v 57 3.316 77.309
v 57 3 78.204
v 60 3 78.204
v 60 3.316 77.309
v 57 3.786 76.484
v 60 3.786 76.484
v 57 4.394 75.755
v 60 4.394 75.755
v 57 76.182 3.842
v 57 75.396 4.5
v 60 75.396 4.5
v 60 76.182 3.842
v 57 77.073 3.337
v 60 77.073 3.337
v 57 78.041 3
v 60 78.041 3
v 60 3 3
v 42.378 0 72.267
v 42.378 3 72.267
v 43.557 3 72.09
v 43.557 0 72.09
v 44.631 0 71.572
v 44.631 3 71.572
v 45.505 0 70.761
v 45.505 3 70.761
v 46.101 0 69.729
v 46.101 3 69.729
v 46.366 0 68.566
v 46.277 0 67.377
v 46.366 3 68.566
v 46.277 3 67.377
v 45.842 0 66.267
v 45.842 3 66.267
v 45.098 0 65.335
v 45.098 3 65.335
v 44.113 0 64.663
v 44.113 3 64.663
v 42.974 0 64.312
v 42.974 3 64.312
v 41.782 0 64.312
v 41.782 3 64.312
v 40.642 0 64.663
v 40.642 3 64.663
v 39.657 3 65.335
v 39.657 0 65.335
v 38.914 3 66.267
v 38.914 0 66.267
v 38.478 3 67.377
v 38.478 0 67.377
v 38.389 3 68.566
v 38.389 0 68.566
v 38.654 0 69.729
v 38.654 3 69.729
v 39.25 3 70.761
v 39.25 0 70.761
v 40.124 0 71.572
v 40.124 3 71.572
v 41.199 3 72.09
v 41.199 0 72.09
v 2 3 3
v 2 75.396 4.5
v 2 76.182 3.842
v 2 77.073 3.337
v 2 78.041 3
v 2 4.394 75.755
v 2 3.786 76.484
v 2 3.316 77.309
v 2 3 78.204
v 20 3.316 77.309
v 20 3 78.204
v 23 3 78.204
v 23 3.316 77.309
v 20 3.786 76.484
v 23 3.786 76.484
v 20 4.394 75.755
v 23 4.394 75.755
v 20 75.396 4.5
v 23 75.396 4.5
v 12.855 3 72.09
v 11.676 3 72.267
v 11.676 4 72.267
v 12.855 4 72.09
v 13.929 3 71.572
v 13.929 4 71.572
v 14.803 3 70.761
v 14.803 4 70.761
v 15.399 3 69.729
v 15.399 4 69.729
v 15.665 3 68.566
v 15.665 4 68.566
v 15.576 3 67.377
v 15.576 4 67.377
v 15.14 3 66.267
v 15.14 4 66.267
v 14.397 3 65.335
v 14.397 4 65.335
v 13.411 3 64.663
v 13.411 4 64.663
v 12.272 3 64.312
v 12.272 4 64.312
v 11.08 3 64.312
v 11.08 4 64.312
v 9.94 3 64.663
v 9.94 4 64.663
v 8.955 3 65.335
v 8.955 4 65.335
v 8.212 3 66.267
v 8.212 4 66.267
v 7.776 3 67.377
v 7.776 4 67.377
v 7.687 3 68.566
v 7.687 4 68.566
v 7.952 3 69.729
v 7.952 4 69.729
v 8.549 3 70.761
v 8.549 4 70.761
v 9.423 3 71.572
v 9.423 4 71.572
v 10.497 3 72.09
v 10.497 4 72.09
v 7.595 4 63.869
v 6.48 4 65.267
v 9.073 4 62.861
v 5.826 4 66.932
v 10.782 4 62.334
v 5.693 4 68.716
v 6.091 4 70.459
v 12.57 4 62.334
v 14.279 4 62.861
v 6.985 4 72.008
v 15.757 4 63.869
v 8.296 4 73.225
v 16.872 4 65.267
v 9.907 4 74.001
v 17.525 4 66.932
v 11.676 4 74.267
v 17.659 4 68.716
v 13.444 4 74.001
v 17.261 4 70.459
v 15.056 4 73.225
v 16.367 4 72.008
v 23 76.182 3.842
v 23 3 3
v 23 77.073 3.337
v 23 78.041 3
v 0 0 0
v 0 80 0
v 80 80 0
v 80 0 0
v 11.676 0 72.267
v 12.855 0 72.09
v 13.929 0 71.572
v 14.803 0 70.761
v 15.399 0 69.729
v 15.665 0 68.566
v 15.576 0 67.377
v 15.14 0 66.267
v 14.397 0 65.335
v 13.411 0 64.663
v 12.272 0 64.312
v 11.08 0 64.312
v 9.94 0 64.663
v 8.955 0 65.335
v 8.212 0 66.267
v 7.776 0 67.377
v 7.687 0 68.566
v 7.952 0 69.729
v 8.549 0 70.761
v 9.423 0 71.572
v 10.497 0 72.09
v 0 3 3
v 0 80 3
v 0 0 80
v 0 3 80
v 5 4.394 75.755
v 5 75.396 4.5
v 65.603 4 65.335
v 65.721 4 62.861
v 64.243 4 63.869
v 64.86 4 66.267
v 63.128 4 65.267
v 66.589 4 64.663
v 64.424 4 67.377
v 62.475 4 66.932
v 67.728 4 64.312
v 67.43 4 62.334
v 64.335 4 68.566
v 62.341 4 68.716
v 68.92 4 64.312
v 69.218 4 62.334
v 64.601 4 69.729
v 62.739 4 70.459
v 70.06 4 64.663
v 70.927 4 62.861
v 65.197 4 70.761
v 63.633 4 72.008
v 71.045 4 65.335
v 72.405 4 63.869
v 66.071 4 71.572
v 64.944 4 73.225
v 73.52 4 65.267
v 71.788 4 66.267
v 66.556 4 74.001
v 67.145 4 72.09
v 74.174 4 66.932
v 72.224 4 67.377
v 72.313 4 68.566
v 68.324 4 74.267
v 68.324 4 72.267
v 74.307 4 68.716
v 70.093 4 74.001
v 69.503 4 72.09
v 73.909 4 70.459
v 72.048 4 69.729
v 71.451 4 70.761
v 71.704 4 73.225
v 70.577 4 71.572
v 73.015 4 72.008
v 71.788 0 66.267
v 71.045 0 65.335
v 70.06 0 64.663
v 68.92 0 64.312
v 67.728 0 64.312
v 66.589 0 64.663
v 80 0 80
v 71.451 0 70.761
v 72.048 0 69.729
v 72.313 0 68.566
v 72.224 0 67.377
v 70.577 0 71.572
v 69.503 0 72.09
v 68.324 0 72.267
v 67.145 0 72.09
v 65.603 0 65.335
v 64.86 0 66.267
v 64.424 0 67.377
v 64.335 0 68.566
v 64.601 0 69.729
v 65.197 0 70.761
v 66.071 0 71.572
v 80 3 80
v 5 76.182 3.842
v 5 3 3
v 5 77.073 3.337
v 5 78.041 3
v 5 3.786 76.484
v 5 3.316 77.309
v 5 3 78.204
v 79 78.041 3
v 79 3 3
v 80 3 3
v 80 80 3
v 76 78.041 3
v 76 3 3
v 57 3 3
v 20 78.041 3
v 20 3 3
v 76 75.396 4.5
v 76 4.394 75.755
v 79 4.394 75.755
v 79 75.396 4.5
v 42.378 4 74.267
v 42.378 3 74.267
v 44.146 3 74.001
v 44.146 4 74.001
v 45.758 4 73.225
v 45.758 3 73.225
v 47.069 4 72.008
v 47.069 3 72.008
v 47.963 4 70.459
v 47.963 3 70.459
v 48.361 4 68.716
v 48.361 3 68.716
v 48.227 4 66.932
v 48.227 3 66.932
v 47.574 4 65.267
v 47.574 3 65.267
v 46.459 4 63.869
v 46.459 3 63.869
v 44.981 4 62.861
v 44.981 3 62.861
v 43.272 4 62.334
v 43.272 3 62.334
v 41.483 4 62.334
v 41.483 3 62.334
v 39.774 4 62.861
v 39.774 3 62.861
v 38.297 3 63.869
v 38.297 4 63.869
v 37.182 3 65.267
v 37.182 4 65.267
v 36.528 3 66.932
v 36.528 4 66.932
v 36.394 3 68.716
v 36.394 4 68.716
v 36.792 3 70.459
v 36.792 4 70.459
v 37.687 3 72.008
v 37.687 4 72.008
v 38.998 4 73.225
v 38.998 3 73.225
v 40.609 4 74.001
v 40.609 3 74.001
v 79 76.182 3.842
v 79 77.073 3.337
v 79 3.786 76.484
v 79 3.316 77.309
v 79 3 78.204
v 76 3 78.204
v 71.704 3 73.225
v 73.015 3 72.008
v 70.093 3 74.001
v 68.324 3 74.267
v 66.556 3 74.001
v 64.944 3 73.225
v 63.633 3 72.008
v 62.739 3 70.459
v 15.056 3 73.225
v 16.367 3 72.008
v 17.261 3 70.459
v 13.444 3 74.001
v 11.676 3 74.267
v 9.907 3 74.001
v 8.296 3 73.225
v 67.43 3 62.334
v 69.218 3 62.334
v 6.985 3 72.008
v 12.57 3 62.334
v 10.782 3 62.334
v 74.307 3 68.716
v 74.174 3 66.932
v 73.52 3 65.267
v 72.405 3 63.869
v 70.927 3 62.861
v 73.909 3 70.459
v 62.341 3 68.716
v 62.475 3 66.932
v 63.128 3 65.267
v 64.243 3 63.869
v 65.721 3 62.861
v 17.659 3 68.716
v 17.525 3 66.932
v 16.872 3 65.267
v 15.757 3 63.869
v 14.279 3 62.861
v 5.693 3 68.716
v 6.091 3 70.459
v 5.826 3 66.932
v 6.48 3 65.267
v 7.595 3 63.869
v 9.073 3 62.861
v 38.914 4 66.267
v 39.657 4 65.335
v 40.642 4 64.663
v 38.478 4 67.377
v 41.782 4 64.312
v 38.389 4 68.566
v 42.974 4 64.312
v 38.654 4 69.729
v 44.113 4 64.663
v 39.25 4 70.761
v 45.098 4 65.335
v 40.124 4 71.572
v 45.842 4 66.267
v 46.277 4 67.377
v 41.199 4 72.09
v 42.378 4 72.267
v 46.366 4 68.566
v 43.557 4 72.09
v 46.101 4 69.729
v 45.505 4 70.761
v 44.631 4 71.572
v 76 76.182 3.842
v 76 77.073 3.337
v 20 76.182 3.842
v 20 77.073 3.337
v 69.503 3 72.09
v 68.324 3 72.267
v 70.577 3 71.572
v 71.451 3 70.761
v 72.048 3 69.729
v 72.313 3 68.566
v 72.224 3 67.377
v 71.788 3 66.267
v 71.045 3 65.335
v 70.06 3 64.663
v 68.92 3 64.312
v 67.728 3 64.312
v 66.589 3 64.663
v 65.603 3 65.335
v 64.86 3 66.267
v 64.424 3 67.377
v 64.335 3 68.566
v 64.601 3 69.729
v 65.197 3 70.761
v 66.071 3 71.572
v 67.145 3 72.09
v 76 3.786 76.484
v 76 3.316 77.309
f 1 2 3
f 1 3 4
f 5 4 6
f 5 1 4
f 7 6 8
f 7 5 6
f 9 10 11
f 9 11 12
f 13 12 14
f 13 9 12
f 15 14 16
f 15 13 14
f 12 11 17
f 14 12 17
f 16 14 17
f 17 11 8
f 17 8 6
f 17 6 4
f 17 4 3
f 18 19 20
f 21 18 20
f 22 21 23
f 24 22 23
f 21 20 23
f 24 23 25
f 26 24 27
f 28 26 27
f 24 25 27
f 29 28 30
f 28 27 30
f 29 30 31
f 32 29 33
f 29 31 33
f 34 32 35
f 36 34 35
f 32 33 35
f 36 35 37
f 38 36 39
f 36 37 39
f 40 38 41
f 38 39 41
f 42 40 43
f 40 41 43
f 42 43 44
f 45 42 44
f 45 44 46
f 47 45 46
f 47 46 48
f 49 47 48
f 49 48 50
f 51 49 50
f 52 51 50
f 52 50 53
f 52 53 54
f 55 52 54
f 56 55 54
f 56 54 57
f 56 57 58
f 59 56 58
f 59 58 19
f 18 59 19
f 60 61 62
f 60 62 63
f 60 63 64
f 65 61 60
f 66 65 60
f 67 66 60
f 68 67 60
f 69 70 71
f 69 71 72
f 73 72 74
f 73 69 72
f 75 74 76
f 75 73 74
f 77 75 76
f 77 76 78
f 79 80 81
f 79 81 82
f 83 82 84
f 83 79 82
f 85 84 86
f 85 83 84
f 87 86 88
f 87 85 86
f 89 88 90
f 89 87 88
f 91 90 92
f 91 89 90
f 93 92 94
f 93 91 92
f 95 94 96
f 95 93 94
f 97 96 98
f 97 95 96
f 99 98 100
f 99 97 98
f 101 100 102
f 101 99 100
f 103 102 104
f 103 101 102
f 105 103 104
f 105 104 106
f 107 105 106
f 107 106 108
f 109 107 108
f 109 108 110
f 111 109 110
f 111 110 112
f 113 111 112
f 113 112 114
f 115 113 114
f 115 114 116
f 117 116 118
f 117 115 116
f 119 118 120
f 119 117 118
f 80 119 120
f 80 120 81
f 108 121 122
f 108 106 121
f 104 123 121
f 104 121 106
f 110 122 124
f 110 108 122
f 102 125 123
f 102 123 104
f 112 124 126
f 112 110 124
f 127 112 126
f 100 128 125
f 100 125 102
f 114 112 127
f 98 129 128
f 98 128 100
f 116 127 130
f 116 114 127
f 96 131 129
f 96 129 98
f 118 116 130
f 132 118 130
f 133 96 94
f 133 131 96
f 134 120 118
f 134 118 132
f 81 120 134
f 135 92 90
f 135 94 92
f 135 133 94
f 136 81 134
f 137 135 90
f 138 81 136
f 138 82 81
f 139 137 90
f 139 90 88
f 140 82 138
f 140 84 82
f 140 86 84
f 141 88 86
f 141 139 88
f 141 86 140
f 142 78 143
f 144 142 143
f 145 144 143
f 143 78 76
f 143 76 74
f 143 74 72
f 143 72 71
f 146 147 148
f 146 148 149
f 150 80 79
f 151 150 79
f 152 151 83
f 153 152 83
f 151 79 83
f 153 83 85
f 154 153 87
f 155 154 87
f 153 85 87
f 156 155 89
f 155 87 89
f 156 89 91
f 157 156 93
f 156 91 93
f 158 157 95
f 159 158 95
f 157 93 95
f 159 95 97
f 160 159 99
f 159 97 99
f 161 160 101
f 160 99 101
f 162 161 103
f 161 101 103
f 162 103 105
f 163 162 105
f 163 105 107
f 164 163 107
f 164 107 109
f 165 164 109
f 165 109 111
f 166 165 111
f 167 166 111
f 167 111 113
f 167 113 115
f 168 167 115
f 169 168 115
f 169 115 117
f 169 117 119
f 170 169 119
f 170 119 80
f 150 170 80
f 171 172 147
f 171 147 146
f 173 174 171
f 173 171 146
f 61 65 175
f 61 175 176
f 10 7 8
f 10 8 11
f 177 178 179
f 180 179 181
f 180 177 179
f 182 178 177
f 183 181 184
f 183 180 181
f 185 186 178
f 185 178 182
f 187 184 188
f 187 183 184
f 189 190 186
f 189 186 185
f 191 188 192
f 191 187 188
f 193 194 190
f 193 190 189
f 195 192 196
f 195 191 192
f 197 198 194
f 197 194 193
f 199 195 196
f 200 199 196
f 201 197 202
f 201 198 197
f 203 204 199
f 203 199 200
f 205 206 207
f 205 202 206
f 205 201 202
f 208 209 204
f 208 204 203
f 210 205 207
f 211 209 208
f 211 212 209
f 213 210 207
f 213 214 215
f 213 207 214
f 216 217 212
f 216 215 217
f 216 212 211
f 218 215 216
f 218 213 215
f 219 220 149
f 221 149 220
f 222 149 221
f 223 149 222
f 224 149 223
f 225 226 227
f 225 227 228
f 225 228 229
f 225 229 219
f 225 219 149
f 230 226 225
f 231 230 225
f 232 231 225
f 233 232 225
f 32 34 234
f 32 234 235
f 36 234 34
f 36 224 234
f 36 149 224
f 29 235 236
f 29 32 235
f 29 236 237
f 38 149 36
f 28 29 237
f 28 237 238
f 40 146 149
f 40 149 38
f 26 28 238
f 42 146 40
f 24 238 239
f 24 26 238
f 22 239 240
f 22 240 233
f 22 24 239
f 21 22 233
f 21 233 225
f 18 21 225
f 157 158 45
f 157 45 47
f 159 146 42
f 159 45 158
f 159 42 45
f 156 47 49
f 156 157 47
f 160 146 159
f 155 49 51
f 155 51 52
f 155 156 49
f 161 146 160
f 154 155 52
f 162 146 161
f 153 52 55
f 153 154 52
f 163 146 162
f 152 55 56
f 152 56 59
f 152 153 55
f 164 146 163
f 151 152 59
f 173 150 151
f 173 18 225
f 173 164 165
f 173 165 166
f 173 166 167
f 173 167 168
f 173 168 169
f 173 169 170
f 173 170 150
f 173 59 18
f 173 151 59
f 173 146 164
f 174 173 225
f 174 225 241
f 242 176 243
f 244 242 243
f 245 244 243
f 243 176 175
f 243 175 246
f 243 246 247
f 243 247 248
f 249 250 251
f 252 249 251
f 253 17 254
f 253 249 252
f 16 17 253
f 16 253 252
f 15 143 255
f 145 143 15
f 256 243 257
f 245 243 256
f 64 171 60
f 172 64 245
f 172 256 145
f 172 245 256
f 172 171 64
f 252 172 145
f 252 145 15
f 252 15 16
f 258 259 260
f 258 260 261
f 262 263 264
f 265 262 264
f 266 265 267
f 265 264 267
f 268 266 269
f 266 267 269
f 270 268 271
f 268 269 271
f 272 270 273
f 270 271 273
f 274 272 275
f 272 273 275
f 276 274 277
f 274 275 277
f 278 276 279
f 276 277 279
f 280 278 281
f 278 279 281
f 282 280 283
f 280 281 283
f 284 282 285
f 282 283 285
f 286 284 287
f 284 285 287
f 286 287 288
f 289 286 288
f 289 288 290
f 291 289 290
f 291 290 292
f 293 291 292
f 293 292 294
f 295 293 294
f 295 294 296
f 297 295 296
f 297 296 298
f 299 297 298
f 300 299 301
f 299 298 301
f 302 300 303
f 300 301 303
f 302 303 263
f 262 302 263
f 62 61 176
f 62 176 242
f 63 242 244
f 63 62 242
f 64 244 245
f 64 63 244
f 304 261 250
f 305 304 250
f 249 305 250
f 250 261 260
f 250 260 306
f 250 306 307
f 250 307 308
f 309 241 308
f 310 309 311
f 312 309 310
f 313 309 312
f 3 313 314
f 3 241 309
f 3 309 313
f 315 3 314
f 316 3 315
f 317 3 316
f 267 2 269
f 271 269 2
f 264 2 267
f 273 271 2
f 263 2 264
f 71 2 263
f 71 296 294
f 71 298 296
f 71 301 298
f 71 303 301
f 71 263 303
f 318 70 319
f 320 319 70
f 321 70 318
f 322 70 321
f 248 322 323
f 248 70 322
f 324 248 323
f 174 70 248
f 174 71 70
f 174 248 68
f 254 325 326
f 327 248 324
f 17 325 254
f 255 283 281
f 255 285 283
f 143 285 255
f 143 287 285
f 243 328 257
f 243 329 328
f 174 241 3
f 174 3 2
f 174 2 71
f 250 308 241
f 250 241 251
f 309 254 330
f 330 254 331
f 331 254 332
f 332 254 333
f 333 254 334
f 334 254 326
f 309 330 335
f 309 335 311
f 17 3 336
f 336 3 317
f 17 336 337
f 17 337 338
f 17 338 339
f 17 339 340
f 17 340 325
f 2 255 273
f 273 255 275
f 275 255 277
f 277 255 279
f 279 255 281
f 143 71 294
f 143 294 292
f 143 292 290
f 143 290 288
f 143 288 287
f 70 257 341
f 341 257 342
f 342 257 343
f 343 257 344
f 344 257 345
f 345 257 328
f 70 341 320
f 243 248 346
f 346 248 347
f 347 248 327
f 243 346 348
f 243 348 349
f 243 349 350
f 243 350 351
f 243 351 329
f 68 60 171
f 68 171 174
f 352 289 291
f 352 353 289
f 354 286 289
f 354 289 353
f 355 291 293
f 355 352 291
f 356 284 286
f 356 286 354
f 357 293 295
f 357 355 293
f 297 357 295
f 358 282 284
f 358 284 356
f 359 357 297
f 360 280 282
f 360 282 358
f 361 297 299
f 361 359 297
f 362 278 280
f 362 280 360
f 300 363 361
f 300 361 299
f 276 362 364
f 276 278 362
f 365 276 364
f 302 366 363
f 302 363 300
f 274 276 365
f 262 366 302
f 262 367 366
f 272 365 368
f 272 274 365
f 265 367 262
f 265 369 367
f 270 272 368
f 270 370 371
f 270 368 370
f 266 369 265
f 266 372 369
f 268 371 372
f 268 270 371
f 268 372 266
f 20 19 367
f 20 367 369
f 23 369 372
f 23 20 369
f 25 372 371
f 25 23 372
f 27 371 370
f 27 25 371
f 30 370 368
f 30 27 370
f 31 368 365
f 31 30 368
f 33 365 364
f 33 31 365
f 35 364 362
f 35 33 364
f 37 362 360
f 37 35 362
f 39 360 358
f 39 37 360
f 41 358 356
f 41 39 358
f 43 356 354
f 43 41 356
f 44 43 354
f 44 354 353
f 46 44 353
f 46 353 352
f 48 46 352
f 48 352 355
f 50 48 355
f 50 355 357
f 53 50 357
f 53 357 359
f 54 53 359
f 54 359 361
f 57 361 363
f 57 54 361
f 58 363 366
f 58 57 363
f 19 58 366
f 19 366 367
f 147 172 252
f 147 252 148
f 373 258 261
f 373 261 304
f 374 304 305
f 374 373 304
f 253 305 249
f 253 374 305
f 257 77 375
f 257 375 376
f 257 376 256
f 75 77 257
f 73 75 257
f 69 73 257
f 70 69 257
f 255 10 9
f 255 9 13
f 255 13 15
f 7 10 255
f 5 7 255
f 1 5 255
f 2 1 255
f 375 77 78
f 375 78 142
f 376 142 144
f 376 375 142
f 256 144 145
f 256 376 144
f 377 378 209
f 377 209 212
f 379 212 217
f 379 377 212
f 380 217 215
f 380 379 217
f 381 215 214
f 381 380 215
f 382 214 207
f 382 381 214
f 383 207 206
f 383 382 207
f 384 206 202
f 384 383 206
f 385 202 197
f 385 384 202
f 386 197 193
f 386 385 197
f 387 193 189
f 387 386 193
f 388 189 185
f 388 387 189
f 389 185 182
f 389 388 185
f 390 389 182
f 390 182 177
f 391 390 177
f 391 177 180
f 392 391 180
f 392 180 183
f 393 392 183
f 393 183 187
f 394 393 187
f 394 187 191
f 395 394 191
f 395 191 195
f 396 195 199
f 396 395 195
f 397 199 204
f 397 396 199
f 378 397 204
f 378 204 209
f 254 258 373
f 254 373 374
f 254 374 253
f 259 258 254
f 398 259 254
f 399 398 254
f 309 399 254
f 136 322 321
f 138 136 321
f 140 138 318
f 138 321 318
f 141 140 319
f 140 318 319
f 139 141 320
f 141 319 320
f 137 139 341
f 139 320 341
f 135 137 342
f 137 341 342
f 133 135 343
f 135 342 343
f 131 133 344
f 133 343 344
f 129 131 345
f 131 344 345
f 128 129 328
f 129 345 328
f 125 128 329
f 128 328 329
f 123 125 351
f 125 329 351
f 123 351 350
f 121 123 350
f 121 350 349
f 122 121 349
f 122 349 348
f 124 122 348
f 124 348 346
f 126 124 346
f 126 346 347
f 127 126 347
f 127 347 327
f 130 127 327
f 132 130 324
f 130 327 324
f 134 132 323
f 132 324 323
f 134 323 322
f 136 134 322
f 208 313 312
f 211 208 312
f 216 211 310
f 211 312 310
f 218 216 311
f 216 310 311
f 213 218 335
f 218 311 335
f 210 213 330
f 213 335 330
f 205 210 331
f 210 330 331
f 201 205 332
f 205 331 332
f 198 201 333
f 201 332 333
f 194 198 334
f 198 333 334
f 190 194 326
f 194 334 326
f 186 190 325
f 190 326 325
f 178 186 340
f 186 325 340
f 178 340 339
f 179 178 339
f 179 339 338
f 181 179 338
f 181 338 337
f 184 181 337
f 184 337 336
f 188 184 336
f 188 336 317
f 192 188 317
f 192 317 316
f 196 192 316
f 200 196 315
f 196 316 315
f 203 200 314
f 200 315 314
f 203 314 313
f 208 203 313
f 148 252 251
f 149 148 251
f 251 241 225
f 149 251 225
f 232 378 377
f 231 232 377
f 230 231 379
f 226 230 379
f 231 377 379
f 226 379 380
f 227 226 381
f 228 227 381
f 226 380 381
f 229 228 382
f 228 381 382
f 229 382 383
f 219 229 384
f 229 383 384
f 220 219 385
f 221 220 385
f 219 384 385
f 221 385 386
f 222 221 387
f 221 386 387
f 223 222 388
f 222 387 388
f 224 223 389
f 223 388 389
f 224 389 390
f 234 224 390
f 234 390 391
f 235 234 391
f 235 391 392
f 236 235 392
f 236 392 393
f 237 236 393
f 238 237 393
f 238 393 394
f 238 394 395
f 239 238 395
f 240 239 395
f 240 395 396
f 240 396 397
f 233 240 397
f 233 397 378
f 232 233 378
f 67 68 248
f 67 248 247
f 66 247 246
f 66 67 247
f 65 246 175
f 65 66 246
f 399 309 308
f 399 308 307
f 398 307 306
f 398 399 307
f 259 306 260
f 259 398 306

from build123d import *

# Parameters (mm, degrees)
PAD001_DEPTH  = 3
PAD_DEPTH     = 80
SKETCH002_R   = 4
POCKET_DEPTH  = 3.001
SKETCH003_R   = 6
SKETCH003_R_2 = 4
PAD002_DEPTH  = 1


with BuildPart() as body001:
    # Sketch001 → Pad001 (new body)
    with BuildSketch(Plane.YZ):
        with BuildLine():
            Line((79.823677, 0), (0, 0))
            Line((0, 0), (0, 79.823677))
            Line((0, 79.823677), (2.832004, 79.823677))
            Line((2.832004, 79.823677), (2.831928, 79.536726))
            ThreePointArc((2.831928, 79.536726), (3.237512, 77.490861), (4.393829, 75.755062))
            Line((4.393829, 75.755062), (75.39639, 4.499797))
            ThreePointArc((75.39639, 4.499797), (77.239452, 3.264747), (79.41524, 2.830951))
            Line((79.823677, 2.830951), (79.41524, 2.830951))
            Line((79.823677, 0), (79.823677, 2.830951))
        make_face()
    extrude(amount=PAD001_DEPTH)


with BuildPart() as body001_1:
    # Body001 placement: moved
    add(body001.part.moved(Location((57, 0, 0))))


with BuildPart() as body002:
    # Body002 base: copy of Body001
    add(body001_1.part)


with BuildPart() as body002_1:
    # Clone placement: moved
    add(body002.part.moved(Location((4, 0, 0))))


with BuildPart() as body002_2:
    # Body002 placement: moved
    add(body002_1.part.moved(Location((-41, 0, 0))))


with BuildPart() as body003:
    # Body003 base: copy of Body001
    add(body001_1.part)


with BuildPart() as body003_1:
    # Body003 placement: moved
    add(body003.part.moved(Location((19, 0, 0))))


with BuildPart() as body004:
    # Body004 base: copy of Body001
    add(body001_1.part)


with BuildPart() as body004_1:
    # Body004 placement: moved
    add(body004.part.moved(Location((-55, 0, 0))))


with BuildPart() as fusion:
    # Sketch → Pad (new body)
    with BuildSketch(Plane.YZ):
        Polygon((0, 0), (0, 80), (3, 80), (3, 3), (80, 3), (80, 0), align=None)
    extrude(amount=PAD_DEPTH)

    # Sketch002 (on Face3 of Pad) → Pocket (cut, through all)
    with BuildSketch(Plane.ZX.offset(3)):
        with Locations((68.267296, 68.324082)):
            Circle(SKETCH002_R)
        with Locations((68.267296, 11.675918)):
            Circle(SKETCH002_R)
        with Locations((68.267296, 42.377682)):
            Circle(SKETCH002_R)
    extrude(amount=-POCKET_DEPTH, mode=Mode.SUBTRACT)

    # Sketch003 (on Face10 of Pocket) → Pad002 (join)
    with BuildSketch(Plane.ZX.offset(3)):
        with Locations((68.267296, 42.377682)):
            Circle(SKETCH003_R)
        with Locations((68.267296, 42.377682)):
            Circle(SKETCH003_R_2, mode=Mode.SUBTRACT)
        with Locations((68.267296, 11.675918)):
            Circle(SKETCH003_R)
        with Locations((68.267296, 11.675918)):
            Circle(SKETCH003_R_2, mode=Mode.SUBTRACT)
        with Locations((68.267296, 68.324082)):
            Circle(SKETCH003_R)
        with Locations((68.267296, 68.324082)):
            Circle(SKETCH003_R_2, mode=Mode.SUBTRACT)
    extrude(amount=PAD002_DEPTH)

    # Fusion: union Body001, Body002, Body003, Body004
    add(body001_1.part)
    add(body002_2.part)
    add(body003_1.part)
    add(body004_1.part)


solid = fusion.part
